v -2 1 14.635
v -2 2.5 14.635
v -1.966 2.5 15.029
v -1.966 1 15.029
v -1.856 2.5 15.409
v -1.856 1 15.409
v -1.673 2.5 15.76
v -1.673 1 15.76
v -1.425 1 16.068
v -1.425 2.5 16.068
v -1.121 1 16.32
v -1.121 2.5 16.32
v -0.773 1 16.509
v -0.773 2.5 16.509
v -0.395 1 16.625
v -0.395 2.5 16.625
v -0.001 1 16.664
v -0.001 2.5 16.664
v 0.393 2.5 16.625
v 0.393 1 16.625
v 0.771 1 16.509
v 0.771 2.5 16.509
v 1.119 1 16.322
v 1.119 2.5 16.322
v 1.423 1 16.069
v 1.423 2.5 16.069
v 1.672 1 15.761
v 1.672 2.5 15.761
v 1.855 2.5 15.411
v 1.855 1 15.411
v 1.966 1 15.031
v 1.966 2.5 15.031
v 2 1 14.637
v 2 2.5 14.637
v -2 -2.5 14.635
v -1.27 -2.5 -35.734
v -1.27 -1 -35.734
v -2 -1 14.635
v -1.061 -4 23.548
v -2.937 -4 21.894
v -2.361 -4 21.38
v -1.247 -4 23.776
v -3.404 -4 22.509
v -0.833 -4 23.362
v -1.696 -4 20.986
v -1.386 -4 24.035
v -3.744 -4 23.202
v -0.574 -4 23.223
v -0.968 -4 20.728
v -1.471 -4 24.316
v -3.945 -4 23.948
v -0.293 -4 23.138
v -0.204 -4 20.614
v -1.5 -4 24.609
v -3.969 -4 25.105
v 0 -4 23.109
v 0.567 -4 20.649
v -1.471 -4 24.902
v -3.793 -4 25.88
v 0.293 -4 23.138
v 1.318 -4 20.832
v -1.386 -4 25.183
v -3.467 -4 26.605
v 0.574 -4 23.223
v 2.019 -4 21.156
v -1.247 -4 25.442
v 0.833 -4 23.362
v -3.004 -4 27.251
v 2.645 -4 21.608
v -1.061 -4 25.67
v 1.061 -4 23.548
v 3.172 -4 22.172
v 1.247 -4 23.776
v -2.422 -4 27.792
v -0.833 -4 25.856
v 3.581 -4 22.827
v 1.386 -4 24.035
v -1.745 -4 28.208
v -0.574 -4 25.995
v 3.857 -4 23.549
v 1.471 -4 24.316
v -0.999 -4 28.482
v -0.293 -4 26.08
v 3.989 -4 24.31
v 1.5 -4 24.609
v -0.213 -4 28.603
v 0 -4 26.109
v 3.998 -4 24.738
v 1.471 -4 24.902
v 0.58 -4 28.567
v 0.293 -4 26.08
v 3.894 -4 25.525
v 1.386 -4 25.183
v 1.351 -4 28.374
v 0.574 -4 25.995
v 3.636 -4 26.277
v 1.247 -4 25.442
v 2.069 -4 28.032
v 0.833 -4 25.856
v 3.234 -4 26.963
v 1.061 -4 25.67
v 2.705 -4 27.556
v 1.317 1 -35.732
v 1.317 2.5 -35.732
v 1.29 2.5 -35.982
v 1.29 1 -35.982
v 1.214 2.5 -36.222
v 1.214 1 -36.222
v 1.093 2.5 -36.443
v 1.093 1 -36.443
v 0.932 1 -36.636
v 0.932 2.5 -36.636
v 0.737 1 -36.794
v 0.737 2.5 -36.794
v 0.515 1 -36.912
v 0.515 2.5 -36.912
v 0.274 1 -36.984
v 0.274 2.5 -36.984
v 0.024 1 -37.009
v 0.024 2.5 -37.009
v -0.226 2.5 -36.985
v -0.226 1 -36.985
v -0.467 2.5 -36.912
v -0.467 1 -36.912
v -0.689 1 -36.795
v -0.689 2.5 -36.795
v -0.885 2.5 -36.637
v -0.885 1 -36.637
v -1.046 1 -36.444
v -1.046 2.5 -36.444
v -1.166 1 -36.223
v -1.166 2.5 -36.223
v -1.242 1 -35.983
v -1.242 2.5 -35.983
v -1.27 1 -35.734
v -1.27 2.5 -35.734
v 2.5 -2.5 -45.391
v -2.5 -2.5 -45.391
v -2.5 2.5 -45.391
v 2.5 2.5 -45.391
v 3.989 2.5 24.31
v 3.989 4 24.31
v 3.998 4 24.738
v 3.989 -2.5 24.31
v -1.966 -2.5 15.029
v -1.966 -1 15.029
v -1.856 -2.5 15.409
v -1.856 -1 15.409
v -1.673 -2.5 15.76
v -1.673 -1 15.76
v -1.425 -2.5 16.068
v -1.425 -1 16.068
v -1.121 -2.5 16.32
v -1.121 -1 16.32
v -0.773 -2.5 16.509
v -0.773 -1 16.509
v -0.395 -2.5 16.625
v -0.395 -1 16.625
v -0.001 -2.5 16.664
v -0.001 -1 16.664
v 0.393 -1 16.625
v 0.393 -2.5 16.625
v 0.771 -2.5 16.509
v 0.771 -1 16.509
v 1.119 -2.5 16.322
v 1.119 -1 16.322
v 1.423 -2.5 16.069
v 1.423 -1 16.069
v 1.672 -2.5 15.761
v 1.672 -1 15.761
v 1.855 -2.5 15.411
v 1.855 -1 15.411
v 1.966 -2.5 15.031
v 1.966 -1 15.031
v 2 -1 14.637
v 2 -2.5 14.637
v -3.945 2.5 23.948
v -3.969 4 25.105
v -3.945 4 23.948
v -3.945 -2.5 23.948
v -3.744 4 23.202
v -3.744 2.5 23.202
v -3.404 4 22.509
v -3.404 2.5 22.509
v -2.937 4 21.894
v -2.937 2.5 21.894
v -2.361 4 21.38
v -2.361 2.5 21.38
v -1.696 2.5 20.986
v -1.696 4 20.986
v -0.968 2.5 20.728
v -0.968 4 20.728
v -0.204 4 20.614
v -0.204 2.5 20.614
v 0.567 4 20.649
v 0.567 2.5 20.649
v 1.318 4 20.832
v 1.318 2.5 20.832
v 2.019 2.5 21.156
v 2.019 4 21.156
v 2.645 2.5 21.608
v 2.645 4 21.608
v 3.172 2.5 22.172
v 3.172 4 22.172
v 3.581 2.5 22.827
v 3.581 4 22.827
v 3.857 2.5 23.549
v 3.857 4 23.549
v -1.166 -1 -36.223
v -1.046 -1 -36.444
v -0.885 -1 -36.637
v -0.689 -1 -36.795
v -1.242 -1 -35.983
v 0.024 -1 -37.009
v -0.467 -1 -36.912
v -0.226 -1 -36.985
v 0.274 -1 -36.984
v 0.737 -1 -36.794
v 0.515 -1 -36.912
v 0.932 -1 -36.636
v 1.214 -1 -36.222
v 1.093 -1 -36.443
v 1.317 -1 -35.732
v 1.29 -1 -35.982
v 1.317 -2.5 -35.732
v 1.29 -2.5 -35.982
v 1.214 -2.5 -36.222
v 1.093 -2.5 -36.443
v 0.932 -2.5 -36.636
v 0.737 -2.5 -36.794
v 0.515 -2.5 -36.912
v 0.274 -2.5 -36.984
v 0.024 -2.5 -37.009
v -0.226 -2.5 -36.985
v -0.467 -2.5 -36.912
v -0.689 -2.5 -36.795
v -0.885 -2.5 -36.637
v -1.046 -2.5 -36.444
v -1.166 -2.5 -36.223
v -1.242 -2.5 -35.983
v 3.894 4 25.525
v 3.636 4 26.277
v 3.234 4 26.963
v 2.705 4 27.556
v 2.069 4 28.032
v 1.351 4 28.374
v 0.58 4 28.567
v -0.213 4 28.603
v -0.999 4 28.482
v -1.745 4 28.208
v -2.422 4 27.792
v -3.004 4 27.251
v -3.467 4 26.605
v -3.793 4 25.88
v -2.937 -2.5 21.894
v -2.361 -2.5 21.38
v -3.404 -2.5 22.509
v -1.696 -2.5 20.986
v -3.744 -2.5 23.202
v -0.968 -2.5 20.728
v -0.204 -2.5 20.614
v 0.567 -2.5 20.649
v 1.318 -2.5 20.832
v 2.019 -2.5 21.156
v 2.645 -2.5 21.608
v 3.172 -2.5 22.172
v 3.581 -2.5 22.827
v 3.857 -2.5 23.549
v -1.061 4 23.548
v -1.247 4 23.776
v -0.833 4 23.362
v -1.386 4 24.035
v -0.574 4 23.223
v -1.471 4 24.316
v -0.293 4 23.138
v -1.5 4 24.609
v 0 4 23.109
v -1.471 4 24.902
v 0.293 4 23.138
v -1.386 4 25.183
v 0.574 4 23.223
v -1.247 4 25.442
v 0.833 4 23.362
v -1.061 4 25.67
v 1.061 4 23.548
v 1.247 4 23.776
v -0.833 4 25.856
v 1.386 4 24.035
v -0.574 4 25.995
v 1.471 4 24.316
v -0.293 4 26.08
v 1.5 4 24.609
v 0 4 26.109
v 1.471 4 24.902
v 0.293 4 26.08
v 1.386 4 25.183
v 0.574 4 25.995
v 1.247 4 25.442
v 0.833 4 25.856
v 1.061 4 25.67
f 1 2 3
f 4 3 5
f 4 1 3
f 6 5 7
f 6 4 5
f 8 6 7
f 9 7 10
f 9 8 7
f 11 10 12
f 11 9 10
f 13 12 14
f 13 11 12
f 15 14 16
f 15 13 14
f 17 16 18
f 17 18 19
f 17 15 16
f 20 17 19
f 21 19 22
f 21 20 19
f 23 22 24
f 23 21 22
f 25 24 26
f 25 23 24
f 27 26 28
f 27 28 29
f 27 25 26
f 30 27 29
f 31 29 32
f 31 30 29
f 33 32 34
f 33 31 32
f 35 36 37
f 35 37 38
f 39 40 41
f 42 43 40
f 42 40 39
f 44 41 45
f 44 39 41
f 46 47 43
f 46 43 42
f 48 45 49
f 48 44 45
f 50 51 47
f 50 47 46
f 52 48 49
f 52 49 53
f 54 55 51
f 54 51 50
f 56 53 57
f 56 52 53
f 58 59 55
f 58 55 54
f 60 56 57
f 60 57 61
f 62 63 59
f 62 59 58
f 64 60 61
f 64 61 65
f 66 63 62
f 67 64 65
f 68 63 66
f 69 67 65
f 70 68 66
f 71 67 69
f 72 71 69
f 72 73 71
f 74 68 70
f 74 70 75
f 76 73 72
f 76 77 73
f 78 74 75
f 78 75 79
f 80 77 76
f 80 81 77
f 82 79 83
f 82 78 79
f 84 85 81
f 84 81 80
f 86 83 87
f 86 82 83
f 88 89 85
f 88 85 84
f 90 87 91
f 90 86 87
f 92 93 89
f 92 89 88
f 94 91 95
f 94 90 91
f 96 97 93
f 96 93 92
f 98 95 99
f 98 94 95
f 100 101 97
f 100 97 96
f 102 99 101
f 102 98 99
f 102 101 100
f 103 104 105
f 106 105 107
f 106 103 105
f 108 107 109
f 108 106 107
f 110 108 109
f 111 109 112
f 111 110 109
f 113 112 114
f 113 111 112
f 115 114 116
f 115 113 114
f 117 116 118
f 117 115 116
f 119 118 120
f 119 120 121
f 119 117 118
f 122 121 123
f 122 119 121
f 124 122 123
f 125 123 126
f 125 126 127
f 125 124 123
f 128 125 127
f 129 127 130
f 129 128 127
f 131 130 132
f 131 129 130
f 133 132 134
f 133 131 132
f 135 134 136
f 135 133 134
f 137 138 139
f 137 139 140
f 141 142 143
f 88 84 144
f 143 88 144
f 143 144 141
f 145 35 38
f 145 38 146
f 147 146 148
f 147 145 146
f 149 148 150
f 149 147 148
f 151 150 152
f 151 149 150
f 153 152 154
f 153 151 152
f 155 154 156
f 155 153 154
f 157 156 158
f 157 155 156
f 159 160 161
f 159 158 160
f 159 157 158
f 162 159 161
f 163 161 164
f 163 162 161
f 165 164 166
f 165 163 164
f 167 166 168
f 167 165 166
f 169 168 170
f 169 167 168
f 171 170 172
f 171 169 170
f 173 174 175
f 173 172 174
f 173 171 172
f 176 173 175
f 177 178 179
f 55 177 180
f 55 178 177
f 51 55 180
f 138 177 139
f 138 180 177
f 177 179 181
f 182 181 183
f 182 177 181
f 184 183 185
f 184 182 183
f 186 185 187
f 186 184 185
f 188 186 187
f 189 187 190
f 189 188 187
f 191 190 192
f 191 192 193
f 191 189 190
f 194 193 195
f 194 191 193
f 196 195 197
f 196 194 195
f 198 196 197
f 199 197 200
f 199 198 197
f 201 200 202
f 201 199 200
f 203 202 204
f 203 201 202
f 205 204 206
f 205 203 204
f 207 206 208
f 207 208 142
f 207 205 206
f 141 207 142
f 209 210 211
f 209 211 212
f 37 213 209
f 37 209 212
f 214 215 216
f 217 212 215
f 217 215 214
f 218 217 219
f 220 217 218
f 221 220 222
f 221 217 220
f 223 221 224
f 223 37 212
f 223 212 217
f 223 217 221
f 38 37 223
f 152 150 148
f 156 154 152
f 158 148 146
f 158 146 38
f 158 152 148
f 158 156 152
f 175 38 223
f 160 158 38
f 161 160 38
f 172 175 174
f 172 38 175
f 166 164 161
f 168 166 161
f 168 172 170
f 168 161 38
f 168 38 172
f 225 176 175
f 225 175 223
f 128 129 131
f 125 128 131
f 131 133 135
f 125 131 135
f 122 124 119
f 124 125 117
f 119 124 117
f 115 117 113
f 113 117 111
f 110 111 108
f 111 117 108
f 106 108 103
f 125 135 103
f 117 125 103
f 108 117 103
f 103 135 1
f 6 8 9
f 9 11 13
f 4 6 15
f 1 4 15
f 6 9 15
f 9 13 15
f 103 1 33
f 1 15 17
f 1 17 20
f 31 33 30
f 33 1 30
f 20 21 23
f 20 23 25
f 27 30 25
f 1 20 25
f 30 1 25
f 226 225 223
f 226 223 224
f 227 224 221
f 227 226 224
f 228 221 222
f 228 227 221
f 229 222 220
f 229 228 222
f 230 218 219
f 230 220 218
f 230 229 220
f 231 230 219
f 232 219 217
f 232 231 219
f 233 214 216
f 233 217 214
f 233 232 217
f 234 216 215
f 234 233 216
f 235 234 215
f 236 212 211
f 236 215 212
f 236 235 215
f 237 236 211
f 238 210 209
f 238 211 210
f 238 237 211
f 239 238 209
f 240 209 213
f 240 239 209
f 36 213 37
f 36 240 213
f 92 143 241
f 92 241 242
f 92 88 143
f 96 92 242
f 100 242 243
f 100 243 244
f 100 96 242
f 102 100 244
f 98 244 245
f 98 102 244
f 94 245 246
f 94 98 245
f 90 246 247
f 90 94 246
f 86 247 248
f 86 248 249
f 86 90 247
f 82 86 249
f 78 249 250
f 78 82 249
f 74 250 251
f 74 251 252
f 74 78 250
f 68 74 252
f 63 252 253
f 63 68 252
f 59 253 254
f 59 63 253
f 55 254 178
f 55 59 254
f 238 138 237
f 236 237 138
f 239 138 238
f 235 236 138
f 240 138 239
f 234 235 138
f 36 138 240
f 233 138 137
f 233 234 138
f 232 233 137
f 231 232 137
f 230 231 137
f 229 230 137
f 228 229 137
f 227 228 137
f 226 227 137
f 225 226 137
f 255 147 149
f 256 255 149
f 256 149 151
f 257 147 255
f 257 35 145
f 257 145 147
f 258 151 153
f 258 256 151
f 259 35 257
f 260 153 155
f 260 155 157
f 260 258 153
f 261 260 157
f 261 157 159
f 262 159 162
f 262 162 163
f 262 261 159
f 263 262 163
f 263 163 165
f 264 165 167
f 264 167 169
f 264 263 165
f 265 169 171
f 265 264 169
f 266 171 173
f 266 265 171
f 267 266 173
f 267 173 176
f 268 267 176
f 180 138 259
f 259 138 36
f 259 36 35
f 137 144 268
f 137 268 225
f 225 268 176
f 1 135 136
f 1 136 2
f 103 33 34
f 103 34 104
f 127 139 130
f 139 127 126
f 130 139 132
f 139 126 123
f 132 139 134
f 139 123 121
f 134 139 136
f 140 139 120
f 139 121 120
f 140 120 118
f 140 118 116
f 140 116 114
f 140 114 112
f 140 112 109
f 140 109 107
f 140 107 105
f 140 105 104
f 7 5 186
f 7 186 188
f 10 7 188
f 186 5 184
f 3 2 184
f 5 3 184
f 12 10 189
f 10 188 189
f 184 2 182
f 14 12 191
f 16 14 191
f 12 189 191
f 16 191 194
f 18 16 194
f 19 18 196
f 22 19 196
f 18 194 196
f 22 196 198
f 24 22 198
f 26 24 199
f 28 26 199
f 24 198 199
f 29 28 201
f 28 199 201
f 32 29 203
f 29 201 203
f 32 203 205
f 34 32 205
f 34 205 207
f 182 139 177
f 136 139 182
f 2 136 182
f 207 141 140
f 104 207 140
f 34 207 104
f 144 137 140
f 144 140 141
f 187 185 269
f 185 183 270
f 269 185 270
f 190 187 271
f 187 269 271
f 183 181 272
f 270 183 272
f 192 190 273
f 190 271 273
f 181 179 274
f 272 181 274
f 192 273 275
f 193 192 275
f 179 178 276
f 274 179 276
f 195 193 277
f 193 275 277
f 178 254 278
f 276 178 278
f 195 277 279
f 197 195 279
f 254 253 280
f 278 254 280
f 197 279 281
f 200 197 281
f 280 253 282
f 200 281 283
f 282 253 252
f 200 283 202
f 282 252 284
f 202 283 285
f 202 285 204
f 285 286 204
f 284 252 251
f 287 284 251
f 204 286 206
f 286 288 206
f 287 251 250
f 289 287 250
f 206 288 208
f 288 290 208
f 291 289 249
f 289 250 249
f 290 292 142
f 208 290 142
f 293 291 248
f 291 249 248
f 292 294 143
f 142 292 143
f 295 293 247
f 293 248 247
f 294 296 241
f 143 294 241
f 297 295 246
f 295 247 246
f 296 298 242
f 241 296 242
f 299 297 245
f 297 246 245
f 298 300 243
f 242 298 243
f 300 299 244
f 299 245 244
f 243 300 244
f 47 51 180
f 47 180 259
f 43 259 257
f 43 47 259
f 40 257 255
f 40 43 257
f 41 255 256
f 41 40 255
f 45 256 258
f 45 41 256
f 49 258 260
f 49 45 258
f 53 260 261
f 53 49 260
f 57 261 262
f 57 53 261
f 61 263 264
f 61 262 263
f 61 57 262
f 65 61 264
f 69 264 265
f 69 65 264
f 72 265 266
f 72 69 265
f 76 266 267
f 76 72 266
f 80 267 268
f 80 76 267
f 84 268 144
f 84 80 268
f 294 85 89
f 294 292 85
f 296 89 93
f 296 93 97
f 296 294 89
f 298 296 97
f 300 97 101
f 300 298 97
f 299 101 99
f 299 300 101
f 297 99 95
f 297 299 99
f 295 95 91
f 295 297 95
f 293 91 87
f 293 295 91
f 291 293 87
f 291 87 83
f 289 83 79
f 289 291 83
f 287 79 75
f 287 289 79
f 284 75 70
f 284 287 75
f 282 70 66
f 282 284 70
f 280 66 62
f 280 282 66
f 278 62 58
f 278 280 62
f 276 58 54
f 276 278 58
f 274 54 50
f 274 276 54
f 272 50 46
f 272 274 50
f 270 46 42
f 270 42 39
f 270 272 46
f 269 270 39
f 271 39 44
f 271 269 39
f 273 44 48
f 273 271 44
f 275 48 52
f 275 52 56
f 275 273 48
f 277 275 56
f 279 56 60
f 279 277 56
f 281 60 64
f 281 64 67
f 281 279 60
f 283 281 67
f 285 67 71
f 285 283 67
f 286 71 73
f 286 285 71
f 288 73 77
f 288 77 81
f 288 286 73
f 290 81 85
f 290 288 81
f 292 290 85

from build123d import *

# Parameters (mm, degrees)
F1_DEPTH = 2.5
F0_R     = 1.5
F2_DEPTH = 4
F3_DEPTH = 1


# Not quite as in the source:
# - a feature names something its author has since deleted; it is built from what else it names


with BuildPart() as f1:
    # F0 (on Front) → F1 (new body, symmetric)
    with BuildSketch(Plane.XZ):
        with BuildLine():
            Line((-3.9449856715, 23.9478669513), (-2.5, -45.3910091387))
            Line((-2.5, -45.3910091387), (2.5, -45.3910091387))
            Line((2.5, -45.3910091387), (3.9887932138, 24.3097798378))
            ThreePointArc((3.9887932138, 24.3097798378), (0.1822772875, 20.6131485868), (-3.9449856715, 23.9478669513))
        make_face()
        with BuildLine():
            ThreePointArc((-1.9997903124, 14.6349845216), (-0.0009328581, 16.6639447346), (1.9998164582, 14.6368500546))
            Line((1.9998164582, 14.6368500546), (1.3173793796, -35.7323714856))
            ThreePointArc((1.3173793796, -35.7323714856), (0.0241016903, -37.0088409461), (-1.270366201, -35.7335784854))
            Line((-1.270366201, -35.7335784854), (-1.9997903124, 14.6349845216))
        make_face(mode=Mode.SUBTRACT)
    extrude(amount=F1_DEPTH, both=True)

    # F0 (on Front) → F2 (join, symmetric)
    with BuildSketch(Plane.XZ):
        with BuildLine():
            Line((-3.9691037619, 25.1051941963), (-3.9449856715, 23.9478669513))
            ThreePointArc((-3.9449856715, 23.9478669513), (0.1822772875, 20.6131485868), (3.9887932138, 24.3097798378))
            Line((3.9887932138, 24.3097798378), (3.9979316153, 24.7376121165))
            ThreePointArc((3.9979316153, 24.7376121165), (0.184355384, 28.6047426804), (-3.9691037619, 25.1051941963))
        make_face()
        with Locations((0, 24.6089933023)):
            Circle(F0_R, mode=Mode.SUBTRACT)
    extrude(amount=F2_DEPTH, both=True)

    # F0 (on Front) → F3 (join, symmetric)
    with BuildSketch(Plane.XZ):
        with BuildLine():
            Line((1.3173793796, -35.7323714856), (1.9998164582, 14.6368500546))
            ThreePointArc((1.9998164582, 14.6368500546), (-0.0009328581, 16.6639447346), (-1.9997903124, 14.6349845216))
            Line((-1.9997903124, 14.6349845216), (-1.270366201, -35.7335784854))
            ThreePointArc((-1.270366201, -35.7335784854), (0.0241016903, -37.0088409461), (1.3173793796, -35.7323714856))
        make_face()
    extrude(amount=F3_DEPTH, both=True)


solid = f1.part
